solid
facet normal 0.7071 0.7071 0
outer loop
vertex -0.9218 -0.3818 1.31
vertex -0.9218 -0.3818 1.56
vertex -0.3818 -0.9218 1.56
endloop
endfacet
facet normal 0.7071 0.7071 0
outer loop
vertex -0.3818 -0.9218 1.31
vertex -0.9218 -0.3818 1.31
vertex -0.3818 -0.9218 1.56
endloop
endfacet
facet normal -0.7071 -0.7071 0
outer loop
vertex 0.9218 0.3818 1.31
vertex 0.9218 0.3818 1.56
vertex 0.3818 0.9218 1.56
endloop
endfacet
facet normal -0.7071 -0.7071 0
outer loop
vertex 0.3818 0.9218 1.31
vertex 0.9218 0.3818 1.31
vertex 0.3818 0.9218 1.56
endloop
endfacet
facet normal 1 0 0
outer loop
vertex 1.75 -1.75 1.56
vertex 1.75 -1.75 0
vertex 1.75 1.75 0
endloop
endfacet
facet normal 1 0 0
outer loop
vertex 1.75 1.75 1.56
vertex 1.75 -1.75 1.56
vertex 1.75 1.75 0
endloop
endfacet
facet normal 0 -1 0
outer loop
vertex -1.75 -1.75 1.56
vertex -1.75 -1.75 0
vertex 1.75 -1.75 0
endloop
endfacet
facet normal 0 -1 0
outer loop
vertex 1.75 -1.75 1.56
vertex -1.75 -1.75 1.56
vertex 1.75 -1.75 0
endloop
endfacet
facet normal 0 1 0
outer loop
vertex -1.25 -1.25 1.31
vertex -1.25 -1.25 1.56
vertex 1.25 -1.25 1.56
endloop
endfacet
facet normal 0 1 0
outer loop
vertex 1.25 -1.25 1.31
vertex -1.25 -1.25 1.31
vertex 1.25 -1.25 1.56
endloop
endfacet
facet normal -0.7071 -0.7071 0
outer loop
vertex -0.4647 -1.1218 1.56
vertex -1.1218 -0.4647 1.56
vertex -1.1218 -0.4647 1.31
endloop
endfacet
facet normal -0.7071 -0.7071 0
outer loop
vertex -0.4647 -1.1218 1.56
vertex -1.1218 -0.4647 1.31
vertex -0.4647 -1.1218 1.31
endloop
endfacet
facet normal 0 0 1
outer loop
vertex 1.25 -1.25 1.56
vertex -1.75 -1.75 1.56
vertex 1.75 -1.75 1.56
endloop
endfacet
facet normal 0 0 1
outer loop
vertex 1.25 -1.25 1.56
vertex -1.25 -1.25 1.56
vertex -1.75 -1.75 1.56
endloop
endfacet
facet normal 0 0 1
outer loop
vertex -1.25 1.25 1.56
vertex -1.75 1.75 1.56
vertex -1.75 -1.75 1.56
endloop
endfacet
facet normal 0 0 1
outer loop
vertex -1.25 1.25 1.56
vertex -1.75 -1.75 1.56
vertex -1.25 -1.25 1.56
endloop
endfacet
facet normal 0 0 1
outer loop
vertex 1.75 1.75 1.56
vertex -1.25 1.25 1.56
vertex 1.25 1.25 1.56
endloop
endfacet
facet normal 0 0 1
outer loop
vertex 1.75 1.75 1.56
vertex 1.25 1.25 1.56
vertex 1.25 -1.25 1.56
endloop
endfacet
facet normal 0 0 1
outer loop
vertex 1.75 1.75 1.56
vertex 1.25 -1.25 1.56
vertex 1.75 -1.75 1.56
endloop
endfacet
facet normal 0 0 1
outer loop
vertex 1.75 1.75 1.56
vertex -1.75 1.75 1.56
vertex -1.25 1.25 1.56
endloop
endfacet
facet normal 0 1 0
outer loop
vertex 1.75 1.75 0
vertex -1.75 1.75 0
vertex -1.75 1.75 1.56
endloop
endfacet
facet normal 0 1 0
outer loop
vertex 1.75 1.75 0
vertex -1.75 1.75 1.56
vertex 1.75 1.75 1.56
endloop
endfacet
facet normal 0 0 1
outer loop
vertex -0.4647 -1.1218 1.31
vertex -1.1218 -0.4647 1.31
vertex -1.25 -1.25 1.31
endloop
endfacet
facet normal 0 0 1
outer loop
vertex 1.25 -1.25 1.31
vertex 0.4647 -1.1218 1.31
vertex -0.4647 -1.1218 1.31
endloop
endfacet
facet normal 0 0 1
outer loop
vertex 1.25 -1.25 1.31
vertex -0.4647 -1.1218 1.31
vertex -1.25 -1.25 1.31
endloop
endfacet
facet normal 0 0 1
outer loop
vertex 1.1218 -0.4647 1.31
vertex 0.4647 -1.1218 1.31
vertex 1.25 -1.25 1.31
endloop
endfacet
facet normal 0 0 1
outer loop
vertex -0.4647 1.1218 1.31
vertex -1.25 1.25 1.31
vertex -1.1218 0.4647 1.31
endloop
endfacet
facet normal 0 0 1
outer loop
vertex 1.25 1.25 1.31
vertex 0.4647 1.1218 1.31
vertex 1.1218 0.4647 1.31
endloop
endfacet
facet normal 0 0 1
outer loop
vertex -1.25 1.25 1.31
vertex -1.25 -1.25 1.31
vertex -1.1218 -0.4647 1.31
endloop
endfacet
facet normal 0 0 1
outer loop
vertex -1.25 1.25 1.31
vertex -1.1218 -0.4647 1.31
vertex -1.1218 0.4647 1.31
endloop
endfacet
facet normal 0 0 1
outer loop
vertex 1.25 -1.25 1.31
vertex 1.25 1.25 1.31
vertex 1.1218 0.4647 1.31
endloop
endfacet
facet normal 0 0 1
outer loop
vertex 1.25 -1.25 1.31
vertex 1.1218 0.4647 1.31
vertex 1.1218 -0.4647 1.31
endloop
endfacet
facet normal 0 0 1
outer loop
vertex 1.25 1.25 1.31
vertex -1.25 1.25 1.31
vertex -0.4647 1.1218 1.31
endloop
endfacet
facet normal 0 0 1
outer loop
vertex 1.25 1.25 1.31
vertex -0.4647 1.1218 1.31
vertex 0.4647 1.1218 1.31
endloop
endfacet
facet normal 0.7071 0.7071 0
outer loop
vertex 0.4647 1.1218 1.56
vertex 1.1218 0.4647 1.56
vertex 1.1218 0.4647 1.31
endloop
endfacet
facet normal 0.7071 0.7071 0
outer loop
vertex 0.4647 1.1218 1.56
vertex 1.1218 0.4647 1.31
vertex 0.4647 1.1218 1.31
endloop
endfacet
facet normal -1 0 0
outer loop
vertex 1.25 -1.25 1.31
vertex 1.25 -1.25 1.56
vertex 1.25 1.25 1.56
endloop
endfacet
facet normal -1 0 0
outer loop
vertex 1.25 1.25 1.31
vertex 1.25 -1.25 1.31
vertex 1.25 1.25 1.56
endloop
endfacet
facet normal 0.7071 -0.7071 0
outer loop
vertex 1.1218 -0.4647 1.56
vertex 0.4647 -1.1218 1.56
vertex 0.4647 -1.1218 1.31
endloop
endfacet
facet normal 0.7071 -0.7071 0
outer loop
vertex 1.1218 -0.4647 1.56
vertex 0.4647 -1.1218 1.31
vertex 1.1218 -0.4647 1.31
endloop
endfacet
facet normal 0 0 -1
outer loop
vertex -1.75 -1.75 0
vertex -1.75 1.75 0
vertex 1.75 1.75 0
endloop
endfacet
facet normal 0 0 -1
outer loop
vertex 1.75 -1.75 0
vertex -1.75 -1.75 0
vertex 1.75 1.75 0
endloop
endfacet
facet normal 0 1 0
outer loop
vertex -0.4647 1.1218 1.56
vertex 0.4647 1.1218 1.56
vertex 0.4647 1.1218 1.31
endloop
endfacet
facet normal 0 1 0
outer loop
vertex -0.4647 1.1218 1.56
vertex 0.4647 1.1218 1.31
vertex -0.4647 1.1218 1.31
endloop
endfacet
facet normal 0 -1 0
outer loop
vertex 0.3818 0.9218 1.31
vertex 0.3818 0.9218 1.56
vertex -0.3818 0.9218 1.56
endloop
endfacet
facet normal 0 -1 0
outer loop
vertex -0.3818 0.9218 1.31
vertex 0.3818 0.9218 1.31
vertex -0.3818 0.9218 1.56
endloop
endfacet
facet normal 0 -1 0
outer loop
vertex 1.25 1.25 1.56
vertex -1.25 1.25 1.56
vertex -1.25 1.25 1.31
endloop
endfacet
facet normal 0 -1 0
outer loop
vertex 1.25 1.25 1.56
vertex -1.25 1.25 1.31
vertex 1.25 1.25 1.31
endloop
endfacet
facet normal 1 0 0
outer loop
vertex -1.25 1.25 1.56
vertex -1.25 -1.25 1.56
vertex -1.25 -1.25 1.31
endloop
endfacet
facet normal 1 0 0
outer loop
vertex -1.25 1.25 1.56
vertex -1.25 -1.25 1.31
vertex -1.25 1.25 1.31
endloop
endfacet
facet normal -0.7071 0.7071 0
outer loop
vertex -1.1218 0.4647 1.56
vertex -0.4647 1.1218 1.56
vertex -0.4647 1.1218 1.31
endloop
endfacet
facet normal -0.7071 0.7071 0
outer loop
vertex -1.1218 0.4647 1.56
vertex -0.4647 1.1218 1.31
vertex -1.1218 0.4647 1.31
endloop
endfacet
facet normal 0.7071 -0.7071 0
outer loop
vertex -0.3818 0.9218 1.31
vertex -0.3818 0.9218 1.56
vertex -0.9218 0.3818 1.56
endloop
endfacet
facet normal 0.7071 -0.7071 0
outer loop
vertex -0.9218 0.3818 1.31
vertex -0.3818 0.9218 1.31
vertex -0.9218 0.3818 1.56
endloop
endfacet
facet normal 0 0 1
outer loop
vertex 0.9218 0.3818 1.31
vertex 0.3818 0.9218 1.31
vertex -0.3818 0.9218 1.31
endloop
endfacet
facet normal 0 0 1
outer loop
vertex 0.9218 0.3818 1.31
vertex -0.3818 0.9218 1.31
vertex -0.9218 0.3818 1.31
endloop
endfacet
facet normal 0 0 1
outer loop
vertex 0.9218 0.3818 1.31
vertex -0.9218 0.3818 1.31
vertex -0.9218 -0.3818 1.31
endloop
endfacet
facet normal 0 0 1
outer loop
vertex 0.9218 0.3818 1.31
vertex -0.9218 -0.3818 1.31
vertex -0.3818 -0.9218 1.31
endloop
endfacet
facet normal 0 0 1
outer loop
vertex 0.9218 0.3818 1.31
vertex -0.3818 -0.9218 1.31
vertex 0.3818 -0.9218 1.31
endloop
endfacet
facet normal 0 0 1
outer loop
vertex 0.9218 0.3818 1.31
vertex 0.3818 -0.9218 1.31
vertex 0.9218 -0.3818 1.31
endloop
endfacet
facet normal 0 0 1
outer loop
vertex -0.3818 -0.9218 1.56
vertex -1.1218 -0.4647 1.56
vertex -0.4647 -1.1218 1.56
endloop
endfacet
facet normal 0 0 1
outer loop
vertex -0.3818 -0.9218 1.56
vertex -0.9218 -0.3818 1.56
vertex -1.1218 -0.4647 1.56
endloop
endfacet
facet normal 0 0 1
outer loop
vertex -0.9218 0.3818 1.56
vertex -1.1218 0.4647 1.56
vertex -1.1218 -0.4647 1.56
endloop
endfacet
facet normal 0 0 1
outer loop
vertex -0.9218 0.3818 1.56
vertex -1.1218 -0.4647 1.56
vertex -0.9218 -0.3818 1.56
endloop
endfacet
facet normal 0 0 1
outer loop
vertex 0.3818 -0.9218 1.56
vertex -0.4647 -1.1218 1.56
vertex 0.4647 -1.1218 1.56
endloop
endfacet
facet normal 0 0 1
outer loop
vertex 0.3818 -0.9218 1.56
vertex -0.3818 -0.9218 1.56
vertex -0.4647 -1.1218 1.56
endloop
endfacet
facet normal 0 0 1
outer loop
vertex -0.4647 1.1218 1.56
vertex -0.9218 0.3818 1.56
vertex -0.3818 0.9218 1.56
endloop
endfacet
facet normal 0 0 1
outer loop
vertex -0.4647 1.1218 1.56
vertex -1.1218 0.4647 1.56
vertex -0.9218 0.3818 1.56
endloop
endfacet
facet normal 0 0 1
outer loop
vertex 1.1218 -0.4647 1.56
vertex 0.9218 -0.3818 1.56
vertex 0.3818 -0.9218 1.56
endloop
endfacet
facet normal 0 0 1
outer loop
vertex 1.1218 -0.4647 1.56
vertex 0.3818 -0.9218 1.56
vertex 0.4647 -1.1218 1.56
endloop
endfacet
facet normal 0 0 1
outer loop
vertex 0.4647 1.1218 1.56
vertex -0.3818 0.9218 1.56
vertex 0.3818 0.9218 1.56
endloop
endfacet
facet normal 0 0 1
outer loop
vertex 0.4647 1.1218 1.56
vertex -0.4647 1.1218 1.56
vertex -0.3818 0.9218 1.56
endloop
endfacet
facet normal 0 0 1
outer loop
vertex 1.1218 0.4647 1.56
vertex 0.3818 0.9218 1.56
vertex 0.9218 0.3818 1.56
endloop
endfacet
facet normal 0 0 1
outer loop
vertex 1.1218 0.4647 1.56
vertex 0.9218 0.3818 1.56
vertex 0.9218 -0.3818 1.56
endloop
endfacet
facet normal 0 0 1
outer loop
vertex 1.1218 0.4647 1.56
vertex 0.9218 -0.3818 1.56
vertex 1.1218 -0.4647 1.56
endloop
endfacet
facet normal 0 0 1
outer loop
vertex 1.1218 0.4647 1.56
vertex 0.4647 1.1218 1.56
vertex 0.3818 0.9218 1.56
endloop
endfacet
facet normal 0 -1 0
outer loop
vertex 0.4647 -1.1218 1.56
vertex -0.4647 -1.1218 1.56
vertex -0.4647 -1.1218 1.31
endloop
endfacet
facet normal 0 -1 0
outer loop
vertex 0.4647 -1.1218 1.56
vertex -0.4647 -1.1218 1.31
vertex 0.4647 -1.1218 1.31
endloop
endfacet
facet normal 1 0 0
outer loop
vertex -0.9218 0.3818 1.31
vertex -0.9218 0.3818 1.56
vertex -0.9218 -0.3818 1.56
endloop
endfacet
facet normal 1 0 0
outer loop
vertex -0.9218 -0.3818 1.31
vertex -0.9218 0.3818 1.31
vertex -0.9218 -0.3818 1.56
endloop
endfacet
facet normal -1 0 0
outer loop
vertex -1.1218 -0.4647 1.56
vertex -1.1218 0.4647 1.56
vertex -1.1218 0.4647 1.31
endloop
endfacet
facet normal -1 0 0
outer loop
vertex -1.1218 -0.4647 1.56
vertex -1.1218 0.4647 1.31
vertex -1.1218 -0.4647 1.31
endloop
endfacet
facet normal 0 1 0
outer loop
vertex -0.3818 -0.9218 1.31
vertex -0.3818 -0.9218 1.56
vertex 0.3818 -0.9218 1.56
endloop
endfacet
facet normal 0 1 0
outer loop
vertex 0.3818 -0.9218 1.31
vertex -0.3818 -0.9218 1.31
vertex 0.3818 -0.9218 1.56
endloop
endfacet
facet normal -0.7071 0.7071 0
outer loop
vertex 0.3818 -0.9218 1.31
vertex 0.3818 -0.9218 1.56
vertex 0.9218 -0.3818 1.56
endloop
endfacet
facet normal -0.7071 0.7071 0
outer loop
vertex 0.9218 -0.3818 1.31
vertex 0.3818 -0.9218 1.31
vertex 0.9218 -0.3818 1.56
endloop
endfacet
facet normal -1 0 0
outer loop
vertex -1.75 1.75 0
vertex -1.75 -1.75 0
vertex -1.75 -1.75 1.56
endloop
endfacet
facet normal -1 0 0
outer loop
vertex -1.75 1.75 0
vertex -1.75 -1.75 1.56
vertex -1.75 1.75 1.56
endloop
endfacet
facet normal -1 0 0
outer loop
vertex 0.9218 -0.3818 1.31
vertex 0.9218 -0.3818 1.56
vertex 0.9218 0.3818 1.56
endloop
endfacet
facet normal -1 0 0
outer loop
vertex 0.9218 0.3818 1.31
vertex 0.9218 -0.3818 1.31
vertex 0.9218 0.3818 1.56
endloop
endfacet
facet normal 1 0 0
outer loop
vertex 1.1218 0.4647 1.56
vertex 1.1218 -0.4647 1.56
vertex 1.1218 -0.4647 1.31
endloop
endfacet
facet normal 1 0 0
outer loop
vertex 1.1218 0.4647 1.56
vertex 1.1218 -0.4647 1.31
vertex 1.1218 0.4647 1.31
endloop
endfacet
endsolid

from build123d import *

# Parameters (mm, degrees)
SKETCH1_W           = 3.5
SKETCH1_H           = 3.5
BOSS_EXTRUDE1_DEPTH = 1.56
SKETCH2_W           = 2.5
SKETCH2_H           = 2.5
CUT_EXTRUDE1_DEPTH  = 0.25
BOSS_EXTRUDE2_DEPTH = 0.25


with BuildPart() as part:
    # Sketch1 → Boss-Extrude1 (new body)
    with BuildSketch(Plane.XY):
        Rectangle(SKETCH1_W, SKETCH1_H)
    extrude(amount=BOSS_EXTRUDE1_DEPTH)

    # Sketch2 → Cut-Extrude1 (cut)
    with BuildSketch(Plane.XY.offset(1.56)):
        Rectangle(SKETCH2_W, SKETCH2_H)
    extrude(amount=-CUT_EXTRUDE1_DEPTH, mode=Mode.SUBTRACT)

    # Sketch3 → Boss-Extrude2 (add)
    with BuildSketch(Plane.XY.offset(1.56)):
        Polygon((-0.4646552, 1.121776886), (-1.121776886, 0.4646552), (-1.121776886, -0.4646552), (-0.4646552, -1.121776886), (0.4646552, -1.121776886), (1.121776886, -0.4646552), (1.121776886, 0.4646552), (0.4646552, 1.121776886), align=None)
        Polygon((-0.381812488, 0.921776886), (-0.921776886, 0.381812488), (-0.921776886, -0.381812488), (-0.381812488, -0.921776886), (0.381812488, -0.921776886), (0.921776886, -0.381812488), (0.921776886, 0.381812488), (0.381812488, 0.921776886), align=None, mode=Mode.SUBTRACT)
    extrude(amount=-BOSS_EXTRUDE2_DEPTH)


solid = part.part
